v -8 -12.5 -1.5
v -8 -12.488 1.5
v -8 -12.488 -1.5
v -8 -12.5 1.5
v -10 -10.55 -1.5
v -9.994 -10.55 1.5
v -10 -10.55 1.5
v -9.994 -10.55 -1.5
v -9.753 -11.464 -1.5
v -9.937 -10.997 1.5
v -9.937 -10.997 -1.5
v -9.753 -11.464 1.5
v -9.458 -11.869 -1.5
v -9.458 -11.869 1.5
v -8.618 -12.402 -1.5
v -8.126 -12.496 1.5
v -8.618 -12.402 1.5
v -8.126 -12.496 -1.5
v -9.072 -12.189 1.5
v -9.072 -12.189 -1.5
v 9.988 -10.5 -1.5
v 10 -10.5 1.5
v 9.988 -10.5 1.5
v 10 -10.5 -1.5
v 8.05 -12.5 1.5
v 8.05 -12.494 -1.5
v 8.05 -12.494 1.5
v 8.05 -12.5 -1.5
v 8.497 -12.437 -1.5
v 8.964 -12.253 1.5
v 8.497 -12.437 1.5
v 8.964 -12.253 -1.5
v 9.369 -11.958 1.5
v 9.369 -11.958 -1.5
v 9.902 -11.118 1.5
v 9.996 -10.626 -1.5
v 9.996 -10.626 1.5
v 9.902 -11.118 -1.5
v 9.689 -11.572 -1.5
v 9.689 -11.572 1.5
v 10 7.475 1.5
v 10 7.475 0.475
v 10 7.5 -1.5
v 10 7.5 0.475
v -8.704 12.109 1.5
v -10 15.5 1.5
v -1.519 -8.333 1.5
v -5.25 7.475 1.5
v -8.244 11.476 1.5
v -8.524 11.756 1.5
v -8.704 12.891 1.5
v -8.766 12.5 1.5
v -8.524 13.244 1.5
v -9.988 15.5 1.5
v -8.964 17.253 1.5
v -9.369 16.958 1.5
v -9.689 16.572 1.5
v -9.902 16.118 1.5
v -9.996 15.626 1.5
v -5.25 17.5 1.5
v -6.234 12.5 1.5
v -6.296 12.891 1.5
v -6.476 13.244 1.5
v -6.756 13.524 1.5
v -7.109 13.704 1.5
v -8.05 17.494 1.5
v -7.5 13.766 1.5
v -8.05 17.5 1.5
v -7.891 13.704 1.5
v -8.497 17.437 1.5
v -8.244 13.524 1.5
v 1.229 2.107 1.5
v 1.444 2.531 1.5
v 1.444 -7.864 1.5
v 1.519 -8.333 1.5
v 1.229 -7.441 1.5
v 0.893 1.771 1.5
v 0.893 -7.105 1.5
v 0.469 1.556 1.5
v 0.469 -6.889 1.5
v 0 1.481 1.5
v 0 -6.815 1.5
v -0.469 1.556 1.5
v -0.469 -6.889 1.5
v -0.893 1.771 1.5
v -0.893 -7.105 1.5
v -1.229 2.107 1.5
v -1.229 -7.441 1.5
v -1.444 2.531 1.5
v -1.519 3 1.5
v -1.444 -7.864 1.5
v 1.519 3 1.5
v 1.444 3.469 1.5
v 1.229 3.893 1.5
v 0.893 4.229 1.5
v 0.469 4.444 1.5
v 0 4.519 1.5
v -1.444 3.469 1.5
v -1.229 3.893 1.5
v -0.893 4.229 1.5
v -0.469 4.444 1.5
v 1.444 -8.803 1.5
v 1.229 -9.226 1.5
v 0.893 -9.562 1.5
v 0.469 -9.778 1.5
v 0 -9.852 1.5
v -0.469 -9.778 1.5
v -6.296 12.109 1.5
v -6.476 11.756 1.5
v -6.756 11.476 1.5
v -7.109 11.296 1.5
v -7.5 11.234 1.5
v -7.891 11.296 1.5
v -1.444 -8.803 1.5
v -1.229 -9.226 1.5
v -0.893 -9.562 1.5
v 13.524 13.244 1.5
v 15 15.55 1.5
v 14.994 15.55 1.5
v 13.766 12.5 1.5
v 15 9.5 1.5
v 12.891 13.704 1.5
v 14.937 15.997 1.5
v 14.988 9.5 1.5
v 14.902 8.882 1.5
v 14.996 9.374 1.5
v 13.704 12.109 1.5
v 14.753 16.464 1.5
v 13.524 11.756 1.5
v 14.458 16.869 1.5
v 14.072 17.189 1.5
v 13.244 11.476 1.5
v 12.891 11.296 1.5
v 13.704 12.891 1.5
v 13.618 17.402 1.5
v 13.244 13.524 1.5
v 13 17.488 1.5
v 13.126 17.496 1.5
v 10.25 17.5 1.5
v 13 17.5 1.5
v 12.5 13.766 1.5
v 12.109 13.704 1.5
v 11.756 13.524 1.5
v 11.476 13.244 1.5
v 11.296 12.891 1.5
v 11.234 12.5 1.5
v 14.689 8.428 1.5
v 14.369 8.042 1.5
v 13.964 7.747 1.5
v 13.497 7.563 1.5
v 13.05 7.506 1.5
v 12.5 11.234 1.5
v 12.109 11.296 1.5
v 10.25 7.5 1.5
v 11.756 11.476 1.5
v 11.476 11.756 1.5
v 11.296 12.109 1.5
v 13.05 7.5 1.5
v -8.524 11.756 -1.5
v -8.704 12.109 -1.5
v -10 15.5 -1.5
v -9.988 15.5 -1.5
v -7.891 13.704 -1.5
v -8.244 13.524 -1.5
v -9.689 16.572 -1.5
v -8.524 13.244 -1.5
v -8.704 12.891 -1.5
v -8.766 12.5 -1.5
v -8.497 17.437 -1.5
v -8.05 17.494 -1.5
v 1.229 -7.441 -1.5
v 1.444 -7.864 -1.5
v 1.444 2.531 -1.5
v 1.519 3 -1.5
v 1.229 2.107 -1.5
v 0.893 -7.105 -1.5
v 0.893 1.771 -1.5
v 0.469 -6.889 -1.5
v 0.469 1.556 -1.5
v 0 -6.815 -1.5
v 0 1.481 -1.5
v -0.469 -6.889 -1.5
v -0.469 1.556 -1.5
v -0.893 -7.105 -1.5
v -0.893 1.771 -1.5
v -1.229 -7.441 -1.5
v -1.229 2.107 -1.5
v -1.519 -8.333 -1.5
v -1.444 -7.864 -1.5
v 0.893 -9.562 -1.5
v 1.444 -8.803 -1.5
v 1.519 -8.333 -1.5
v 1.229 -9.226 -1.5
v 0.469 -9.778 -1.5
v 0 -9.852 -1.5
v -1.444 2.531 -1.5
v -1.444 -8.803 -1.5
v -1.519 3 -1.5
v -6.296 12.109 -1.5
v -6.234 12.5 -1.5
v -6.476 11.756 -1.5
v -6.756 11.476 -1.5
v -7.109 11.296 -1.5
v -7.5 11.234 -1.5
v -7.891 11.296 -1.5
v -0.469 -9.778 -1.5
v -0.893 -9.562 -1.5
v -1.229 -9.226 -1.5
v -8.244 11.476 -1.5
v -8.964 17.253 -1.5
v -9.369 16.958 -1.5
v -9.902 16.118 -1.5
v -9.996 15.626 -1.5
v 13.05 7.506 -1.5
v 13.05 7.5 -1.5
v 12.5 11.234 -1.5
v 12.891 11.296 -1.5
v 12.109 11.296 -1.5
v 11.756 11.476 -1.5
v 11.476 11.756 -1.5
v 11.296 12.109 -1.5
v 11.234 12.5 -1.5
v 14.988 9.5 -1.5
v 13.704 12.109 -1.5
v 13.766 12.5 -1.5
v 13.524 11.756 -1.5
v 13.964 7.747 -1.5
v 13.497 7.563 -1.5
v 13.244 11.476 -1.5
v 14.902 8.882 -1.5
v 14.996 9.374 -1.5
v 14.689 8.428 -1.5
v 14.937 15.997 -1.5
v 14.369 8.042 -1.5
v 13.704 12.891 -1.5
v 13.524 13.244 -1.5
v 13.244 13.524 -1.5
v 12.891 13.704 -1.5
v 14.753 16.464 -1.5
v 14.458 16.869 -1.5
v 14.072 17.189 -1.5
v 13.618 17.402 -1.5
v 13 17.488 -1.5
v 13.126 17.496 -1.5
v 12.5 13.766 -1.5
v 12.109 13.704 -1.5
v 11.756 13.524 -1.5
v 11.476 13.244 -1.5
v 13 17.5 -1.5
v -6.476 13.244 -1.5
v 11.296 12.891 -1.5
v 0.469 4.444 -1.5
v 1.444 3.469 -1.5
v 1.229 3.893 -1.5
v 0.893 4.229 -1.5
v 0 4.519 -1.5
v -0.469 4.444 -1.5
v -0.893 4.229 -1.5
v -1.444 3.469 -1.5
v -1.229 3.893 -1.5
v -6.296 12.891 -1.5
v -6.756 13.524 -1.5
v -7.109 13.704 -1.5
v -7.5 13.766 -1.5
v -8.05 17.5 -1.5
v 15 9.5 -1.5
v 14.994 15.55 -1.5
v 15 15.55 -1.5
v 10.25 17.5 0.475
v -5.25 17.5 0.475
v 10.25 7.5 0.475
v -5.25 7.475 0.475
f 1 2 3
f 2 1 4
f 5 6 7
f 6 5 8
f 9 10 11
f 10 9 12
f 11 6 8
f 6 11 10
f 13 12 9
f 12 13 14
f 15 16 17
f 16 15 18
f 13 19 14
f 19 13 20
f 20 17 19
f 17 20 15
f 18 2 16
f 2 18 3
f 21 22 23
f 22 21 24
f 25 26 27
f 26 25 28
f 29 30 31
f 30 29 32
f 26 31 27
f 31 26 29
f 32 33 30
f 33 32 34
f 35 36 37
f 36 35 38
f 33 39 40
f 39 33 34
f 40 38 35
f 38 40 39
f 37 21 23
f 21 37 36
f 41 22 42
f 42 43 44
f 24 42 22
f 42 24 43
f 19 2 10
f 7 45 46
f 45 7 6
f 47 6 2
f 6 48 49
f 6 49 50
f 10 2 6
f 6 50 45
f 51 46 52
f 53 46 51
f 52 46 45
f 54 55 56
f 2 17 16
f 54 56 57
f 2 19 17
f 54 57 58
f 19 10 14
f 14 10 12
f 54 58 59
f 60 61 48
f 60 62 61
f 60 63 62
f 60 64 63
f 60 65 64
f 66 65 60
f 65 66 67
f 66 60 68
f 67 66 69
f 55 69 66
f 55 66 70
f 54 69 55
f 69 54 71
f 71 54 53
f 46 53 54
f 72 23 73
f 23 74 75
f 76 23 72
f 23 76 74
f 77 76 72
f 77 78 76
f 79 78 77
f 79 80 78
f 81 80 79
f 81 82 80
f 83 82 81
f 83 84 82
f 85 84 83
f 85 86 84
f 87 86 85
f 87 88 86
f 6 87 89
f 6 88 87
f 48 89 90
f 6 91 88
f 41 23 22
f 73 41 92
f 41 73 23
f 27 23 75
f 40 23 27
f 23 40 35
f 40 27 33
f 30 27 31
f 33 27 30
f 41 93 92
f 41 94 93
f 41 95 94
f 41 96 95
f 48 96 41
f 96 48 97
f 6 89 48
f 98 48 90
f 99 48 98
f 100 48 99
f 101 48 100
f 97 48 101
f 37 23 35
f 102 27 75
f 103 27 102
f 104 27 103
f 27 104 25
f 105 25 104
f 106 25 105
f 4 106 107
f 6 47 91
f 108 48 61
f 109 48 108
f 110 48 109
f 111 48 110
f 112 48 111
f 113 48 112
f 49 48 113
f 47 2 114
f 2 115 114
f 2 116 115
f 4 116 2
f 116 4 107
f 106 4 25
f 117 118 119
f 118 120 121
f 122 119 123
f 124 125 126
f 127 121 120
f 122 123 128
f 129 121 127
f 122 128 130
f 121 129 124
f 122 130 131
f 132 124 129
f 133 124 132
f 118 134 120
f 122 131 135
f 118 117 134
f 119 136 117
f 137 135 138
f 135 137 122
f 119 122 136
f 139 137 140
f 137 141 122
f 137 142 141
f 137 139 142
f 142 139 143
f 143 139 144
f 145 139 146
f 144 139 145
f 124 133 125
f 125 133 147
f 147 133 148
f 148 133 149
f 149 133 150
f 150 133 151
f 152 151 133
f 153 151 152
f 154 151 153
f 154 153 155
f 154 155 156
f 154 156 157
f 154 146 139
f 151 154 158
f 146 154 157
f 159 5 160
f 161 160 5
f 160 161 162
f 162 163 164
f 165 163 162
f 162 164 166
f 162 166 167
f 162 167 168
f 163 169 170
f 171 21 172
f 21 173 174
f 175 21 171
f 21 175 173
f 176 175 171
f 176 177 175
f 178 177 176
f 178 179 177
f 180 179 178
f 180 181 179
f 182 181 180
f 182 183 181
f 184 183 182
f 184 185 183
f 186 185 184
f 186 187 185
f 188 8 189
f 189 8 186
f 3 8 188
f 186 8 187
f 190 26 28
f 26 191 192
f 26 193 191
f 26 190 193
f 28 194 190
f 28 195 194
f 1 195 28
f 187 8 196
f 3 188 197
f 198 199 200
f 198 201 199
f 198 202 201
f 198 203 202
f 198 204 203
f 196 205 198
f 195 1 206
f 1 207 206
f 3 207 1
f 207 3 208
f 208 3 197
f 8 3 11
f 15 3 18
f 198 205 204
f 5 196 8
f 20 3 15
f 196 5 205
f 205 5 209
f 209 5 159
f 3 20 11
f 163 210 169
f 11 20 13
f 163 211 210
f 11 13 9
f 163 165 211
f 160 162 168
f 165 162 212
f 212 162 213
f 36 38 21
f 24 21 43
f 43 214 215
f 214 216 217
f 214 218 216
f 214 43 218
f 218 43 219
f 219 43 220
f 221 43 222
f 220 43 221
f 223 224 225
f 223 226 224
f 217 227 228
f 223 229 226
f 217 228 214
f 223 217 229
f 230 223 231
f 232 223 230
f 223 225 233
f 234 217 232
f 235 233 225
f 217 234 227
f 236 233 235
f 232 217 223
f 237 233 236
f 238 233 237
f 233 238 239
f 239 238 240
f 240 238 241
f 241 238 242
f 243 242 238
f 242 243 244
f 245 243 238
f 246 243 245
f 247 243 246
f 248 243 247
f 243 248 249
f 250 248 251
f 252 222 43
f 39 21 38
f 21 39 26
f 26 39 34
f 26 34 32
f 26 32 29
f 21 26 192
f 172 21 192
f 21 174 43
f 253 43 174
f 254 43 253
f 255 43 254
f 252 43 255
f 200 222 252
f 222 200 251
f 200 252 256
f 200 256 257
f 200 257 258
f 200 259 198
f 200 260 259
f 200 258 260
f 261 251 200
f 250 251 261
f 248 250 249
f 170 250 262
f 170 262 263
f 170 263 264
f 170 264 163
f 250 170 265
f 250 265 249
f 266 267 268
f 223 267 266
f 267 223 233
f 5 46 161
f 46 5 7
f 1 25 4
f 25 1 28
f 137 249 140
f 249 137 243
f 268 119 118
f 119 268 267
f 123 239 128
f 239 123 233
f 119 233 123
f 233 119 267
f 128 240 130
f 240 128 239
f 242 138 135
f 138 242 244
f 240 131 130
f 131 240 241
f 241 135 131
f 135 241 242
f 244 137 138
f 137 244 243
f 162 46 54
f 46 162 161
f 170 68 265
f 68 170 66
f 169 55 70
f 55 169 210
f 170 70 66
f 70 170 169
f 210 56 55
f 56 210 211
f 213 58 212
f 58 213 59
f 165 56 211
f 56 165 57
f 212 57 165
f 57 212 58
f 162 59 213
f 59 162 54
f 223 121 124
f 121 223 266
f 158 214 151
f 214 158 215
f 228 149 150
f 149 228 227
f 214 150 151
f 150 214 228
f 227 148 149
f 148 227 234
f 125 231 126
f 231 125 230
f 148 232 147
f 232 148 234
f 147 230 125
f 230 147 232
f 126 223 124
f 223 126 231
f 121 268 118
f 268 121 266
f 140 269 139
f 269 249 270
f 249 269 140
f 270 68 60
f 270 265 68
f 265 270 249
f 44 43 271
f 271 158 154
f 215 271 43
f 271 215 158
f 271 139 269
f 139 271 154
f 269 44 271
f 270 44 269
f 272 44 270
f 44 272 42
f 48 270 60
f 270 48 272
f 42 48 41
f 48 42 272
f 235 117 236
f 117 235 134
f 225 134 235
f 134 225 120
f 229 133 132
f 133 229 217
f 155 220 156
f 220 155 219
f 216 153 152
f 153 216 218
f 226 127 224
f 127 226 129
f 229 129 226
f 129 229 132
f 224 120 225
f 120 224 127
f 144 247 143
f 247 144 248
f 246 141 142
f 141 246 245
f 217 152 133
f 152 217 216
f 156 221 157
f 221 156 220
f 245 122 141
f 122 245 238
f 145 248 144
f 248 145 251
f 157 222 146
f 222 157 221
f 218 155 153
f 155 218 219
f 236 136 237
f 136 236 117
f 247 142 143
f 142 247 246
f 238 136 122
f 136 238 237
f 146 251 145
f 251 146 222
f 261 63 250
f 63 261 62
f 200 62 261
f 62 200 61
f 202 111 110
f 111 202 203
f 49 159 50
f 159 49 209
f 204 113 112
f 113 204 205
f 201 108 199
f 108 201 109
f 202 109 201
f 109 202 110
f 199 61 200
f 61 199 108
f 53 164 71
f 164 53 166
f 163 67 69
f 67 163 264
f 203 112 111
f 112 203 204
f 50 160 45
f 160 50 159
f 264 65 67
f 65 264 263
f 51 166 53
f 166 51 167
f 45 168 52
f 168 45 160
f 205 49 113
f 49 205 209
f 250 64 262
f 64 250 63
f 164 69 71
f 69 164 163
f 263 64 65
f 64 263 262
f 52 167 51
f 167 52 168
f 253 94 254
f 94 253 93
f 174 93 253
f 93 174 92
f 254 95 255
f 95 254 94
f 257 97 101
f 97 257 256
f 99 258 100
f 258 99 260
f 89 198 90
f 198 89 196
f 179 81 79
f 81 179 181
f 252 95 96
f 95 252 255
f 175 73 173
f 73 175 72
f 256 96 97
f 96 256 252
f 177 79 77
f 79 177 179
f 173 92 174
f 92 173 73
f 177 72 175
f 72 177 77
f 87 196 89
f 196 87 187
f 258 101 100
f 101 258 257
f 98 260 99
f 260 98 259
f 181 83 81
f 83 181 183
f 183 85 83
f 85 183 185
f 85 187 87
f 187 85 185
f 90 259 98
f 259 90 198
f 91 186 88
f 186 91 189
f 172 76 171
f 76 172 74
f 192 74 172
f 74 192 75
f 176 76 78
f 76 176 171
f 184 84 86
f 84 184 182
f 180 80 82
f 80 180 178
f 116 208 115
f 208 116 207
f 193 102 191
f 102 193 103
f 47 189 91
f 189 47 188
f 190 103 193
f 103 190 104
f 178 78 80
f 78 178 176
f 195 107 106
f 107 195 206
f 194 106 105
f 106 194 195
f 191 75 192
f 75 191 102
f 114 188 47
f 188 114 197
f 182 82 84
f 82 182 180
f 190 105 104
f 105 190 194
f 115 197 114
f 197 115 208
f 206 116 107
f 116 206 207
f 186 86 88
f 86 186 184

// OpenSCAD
// The amount added to a cut out to ensure a clean hole. 
holeCreationOffset=0.05;
// How thick the endstop is 
endstopThickness=3;
// How deep the recess is inside of the endstop, this is the cut out for the circuitry on the bottomside of the endstop PCB
endstopRecessDepth=1;
// How tall the recess is into the endstop part
endstopRecessHeight=10;
// How wide the recessed portion of the endstop is
endstopRecessWidth=15.5;
// How tall the over all endstop is
endstopHeight=25;
// How wide the endstop is, this should equal your aluminum extrusion width
endstopNarrowWidth=20;
// The shelf that is on the endstop, this is to offset the opticoupler by the amount needed to center the opticoupler
enstopShelfWidth=25;
// How tall the shelf is, this should be the height of the opticoupler
endstopShelfHeight=10;
endstopShelfOffset=enstopShelfWidth-endstopNarrowWidth;
// The offset for the opticouplers mounting holes, center to center
endstopBoltHoleWidth=19.5;
// The diameter of the mounting holes for the opticoupler
endstopBoltHoleDiameter=2.5;
// The diameter of the mounting holes for the endstop bracket itself
mountingBoltHoleDiameter=3;
mountingBoltHoleRadius=mountingBoltHoleDiameter/2;
endstopBoltHoleRadius=endstopBoltHoleDiameter/2;


module cylinder_outer(height,radius,fn){
   fudge = 1/cos(180/fn);
   cylinder(h=height,r=radius*fudge,$fn=fn, center = true);
}
   
module cylinder_outerdual(height,radius,radiustwo,fn){
   fudge = 1/cos(180/fn);
   cylinder(h=height,r1=radius*fudge,r2=radiustwo*fudge,$fn=fn, center = true);
}
   
module cylinder_mid(height,radius,fn){
   fudge = (1+1/cos(180/fn))/2;
   cylinder(h=height,r=radius*fudge,$fn=fn, center = true);
}
   
module createMeniscus(h,radius) {// This module creates the shape that needs to be substracted from a cube to make its corners rounded.
    difference(){        //This shape is basicly the difference between a quarter of cylinder and a cube
       translate([radius/2+0.1,radius/2+0.1,0]){
          cube([radius+0.2,radius+0.1,h+0.2],center=true);         // All that 0.x numbers are to avoid "ghost boundaries" when substracting
       }

       cylinder(h=h+0.2,r=radius,$fn = 25,center=true);
    }
}

module roundCornersCube(x,y,z,r){  // Now we just substract the shape we have created in the four corners
    difference(){
       cube([x,y,z], center=true);

    translate([x/2-r,y/2-r]){  // We move to the first corner (x,y)
          rotate(0){  
             createMeniscus(z,r); // And substract the meniscus
          }
       }
       translate([-x/2+r,y/2-r]){ // To the second corner (-x,y)
          rotate(90){
             createMeniscus(z,r); // But this time we have to rotate the meniscus 90 deg
          }
       }
          translate([-x/2+r,-y/2+r]){ // ... 
          rotate(180){
             createMeniscus(z,r);
          }
       }
          translate([x/2-r,-y/2+r]){
          rotate(270){
             createMeniscus(z,r);
          }
       }
    }
}


module endstop(){
    difference (){
        union(){
            roundCornersCube(endstopNarrowWidth,endstopHeight,endstopThickness,2);
            translate([endstopShelfOffset/2,endstopHeight/2,0]) roundCornersCube(enstopShelfWidth,endstopShelfHeight,endstopThickness,2);
        }
    translate([endstopShelfOffset/2,endstopHeight/2,(endstopThickness/2) - (endstopRecessDepth/2)]) cube([endstopRecessWidth,endstopRecessHeight + holeCreationOffset,endstopRecessDepth + holeCreationOffset], center=true);
        translate([endstopNarrowWidth/2 + endstopShelfOffset/2,endstopHeight/2,0]) cylinder_outer(20,endstopBoltHoleRadius,20); 
translate([-enstopShelfWidth/2 + endstopShelfOffset,endstopHeight/2,0]) cylinder_outer(20,endstopBoltHoleRadius,20); 
        
        translate([0,3,0]) cylinder_outer(20,mountingBoltHoleRadius,20); 
        translate([0,-endstopHeight/3,0]) cylinder_outer(20,mountingBoltHoleRadius,20);
    }
}


endstop();
